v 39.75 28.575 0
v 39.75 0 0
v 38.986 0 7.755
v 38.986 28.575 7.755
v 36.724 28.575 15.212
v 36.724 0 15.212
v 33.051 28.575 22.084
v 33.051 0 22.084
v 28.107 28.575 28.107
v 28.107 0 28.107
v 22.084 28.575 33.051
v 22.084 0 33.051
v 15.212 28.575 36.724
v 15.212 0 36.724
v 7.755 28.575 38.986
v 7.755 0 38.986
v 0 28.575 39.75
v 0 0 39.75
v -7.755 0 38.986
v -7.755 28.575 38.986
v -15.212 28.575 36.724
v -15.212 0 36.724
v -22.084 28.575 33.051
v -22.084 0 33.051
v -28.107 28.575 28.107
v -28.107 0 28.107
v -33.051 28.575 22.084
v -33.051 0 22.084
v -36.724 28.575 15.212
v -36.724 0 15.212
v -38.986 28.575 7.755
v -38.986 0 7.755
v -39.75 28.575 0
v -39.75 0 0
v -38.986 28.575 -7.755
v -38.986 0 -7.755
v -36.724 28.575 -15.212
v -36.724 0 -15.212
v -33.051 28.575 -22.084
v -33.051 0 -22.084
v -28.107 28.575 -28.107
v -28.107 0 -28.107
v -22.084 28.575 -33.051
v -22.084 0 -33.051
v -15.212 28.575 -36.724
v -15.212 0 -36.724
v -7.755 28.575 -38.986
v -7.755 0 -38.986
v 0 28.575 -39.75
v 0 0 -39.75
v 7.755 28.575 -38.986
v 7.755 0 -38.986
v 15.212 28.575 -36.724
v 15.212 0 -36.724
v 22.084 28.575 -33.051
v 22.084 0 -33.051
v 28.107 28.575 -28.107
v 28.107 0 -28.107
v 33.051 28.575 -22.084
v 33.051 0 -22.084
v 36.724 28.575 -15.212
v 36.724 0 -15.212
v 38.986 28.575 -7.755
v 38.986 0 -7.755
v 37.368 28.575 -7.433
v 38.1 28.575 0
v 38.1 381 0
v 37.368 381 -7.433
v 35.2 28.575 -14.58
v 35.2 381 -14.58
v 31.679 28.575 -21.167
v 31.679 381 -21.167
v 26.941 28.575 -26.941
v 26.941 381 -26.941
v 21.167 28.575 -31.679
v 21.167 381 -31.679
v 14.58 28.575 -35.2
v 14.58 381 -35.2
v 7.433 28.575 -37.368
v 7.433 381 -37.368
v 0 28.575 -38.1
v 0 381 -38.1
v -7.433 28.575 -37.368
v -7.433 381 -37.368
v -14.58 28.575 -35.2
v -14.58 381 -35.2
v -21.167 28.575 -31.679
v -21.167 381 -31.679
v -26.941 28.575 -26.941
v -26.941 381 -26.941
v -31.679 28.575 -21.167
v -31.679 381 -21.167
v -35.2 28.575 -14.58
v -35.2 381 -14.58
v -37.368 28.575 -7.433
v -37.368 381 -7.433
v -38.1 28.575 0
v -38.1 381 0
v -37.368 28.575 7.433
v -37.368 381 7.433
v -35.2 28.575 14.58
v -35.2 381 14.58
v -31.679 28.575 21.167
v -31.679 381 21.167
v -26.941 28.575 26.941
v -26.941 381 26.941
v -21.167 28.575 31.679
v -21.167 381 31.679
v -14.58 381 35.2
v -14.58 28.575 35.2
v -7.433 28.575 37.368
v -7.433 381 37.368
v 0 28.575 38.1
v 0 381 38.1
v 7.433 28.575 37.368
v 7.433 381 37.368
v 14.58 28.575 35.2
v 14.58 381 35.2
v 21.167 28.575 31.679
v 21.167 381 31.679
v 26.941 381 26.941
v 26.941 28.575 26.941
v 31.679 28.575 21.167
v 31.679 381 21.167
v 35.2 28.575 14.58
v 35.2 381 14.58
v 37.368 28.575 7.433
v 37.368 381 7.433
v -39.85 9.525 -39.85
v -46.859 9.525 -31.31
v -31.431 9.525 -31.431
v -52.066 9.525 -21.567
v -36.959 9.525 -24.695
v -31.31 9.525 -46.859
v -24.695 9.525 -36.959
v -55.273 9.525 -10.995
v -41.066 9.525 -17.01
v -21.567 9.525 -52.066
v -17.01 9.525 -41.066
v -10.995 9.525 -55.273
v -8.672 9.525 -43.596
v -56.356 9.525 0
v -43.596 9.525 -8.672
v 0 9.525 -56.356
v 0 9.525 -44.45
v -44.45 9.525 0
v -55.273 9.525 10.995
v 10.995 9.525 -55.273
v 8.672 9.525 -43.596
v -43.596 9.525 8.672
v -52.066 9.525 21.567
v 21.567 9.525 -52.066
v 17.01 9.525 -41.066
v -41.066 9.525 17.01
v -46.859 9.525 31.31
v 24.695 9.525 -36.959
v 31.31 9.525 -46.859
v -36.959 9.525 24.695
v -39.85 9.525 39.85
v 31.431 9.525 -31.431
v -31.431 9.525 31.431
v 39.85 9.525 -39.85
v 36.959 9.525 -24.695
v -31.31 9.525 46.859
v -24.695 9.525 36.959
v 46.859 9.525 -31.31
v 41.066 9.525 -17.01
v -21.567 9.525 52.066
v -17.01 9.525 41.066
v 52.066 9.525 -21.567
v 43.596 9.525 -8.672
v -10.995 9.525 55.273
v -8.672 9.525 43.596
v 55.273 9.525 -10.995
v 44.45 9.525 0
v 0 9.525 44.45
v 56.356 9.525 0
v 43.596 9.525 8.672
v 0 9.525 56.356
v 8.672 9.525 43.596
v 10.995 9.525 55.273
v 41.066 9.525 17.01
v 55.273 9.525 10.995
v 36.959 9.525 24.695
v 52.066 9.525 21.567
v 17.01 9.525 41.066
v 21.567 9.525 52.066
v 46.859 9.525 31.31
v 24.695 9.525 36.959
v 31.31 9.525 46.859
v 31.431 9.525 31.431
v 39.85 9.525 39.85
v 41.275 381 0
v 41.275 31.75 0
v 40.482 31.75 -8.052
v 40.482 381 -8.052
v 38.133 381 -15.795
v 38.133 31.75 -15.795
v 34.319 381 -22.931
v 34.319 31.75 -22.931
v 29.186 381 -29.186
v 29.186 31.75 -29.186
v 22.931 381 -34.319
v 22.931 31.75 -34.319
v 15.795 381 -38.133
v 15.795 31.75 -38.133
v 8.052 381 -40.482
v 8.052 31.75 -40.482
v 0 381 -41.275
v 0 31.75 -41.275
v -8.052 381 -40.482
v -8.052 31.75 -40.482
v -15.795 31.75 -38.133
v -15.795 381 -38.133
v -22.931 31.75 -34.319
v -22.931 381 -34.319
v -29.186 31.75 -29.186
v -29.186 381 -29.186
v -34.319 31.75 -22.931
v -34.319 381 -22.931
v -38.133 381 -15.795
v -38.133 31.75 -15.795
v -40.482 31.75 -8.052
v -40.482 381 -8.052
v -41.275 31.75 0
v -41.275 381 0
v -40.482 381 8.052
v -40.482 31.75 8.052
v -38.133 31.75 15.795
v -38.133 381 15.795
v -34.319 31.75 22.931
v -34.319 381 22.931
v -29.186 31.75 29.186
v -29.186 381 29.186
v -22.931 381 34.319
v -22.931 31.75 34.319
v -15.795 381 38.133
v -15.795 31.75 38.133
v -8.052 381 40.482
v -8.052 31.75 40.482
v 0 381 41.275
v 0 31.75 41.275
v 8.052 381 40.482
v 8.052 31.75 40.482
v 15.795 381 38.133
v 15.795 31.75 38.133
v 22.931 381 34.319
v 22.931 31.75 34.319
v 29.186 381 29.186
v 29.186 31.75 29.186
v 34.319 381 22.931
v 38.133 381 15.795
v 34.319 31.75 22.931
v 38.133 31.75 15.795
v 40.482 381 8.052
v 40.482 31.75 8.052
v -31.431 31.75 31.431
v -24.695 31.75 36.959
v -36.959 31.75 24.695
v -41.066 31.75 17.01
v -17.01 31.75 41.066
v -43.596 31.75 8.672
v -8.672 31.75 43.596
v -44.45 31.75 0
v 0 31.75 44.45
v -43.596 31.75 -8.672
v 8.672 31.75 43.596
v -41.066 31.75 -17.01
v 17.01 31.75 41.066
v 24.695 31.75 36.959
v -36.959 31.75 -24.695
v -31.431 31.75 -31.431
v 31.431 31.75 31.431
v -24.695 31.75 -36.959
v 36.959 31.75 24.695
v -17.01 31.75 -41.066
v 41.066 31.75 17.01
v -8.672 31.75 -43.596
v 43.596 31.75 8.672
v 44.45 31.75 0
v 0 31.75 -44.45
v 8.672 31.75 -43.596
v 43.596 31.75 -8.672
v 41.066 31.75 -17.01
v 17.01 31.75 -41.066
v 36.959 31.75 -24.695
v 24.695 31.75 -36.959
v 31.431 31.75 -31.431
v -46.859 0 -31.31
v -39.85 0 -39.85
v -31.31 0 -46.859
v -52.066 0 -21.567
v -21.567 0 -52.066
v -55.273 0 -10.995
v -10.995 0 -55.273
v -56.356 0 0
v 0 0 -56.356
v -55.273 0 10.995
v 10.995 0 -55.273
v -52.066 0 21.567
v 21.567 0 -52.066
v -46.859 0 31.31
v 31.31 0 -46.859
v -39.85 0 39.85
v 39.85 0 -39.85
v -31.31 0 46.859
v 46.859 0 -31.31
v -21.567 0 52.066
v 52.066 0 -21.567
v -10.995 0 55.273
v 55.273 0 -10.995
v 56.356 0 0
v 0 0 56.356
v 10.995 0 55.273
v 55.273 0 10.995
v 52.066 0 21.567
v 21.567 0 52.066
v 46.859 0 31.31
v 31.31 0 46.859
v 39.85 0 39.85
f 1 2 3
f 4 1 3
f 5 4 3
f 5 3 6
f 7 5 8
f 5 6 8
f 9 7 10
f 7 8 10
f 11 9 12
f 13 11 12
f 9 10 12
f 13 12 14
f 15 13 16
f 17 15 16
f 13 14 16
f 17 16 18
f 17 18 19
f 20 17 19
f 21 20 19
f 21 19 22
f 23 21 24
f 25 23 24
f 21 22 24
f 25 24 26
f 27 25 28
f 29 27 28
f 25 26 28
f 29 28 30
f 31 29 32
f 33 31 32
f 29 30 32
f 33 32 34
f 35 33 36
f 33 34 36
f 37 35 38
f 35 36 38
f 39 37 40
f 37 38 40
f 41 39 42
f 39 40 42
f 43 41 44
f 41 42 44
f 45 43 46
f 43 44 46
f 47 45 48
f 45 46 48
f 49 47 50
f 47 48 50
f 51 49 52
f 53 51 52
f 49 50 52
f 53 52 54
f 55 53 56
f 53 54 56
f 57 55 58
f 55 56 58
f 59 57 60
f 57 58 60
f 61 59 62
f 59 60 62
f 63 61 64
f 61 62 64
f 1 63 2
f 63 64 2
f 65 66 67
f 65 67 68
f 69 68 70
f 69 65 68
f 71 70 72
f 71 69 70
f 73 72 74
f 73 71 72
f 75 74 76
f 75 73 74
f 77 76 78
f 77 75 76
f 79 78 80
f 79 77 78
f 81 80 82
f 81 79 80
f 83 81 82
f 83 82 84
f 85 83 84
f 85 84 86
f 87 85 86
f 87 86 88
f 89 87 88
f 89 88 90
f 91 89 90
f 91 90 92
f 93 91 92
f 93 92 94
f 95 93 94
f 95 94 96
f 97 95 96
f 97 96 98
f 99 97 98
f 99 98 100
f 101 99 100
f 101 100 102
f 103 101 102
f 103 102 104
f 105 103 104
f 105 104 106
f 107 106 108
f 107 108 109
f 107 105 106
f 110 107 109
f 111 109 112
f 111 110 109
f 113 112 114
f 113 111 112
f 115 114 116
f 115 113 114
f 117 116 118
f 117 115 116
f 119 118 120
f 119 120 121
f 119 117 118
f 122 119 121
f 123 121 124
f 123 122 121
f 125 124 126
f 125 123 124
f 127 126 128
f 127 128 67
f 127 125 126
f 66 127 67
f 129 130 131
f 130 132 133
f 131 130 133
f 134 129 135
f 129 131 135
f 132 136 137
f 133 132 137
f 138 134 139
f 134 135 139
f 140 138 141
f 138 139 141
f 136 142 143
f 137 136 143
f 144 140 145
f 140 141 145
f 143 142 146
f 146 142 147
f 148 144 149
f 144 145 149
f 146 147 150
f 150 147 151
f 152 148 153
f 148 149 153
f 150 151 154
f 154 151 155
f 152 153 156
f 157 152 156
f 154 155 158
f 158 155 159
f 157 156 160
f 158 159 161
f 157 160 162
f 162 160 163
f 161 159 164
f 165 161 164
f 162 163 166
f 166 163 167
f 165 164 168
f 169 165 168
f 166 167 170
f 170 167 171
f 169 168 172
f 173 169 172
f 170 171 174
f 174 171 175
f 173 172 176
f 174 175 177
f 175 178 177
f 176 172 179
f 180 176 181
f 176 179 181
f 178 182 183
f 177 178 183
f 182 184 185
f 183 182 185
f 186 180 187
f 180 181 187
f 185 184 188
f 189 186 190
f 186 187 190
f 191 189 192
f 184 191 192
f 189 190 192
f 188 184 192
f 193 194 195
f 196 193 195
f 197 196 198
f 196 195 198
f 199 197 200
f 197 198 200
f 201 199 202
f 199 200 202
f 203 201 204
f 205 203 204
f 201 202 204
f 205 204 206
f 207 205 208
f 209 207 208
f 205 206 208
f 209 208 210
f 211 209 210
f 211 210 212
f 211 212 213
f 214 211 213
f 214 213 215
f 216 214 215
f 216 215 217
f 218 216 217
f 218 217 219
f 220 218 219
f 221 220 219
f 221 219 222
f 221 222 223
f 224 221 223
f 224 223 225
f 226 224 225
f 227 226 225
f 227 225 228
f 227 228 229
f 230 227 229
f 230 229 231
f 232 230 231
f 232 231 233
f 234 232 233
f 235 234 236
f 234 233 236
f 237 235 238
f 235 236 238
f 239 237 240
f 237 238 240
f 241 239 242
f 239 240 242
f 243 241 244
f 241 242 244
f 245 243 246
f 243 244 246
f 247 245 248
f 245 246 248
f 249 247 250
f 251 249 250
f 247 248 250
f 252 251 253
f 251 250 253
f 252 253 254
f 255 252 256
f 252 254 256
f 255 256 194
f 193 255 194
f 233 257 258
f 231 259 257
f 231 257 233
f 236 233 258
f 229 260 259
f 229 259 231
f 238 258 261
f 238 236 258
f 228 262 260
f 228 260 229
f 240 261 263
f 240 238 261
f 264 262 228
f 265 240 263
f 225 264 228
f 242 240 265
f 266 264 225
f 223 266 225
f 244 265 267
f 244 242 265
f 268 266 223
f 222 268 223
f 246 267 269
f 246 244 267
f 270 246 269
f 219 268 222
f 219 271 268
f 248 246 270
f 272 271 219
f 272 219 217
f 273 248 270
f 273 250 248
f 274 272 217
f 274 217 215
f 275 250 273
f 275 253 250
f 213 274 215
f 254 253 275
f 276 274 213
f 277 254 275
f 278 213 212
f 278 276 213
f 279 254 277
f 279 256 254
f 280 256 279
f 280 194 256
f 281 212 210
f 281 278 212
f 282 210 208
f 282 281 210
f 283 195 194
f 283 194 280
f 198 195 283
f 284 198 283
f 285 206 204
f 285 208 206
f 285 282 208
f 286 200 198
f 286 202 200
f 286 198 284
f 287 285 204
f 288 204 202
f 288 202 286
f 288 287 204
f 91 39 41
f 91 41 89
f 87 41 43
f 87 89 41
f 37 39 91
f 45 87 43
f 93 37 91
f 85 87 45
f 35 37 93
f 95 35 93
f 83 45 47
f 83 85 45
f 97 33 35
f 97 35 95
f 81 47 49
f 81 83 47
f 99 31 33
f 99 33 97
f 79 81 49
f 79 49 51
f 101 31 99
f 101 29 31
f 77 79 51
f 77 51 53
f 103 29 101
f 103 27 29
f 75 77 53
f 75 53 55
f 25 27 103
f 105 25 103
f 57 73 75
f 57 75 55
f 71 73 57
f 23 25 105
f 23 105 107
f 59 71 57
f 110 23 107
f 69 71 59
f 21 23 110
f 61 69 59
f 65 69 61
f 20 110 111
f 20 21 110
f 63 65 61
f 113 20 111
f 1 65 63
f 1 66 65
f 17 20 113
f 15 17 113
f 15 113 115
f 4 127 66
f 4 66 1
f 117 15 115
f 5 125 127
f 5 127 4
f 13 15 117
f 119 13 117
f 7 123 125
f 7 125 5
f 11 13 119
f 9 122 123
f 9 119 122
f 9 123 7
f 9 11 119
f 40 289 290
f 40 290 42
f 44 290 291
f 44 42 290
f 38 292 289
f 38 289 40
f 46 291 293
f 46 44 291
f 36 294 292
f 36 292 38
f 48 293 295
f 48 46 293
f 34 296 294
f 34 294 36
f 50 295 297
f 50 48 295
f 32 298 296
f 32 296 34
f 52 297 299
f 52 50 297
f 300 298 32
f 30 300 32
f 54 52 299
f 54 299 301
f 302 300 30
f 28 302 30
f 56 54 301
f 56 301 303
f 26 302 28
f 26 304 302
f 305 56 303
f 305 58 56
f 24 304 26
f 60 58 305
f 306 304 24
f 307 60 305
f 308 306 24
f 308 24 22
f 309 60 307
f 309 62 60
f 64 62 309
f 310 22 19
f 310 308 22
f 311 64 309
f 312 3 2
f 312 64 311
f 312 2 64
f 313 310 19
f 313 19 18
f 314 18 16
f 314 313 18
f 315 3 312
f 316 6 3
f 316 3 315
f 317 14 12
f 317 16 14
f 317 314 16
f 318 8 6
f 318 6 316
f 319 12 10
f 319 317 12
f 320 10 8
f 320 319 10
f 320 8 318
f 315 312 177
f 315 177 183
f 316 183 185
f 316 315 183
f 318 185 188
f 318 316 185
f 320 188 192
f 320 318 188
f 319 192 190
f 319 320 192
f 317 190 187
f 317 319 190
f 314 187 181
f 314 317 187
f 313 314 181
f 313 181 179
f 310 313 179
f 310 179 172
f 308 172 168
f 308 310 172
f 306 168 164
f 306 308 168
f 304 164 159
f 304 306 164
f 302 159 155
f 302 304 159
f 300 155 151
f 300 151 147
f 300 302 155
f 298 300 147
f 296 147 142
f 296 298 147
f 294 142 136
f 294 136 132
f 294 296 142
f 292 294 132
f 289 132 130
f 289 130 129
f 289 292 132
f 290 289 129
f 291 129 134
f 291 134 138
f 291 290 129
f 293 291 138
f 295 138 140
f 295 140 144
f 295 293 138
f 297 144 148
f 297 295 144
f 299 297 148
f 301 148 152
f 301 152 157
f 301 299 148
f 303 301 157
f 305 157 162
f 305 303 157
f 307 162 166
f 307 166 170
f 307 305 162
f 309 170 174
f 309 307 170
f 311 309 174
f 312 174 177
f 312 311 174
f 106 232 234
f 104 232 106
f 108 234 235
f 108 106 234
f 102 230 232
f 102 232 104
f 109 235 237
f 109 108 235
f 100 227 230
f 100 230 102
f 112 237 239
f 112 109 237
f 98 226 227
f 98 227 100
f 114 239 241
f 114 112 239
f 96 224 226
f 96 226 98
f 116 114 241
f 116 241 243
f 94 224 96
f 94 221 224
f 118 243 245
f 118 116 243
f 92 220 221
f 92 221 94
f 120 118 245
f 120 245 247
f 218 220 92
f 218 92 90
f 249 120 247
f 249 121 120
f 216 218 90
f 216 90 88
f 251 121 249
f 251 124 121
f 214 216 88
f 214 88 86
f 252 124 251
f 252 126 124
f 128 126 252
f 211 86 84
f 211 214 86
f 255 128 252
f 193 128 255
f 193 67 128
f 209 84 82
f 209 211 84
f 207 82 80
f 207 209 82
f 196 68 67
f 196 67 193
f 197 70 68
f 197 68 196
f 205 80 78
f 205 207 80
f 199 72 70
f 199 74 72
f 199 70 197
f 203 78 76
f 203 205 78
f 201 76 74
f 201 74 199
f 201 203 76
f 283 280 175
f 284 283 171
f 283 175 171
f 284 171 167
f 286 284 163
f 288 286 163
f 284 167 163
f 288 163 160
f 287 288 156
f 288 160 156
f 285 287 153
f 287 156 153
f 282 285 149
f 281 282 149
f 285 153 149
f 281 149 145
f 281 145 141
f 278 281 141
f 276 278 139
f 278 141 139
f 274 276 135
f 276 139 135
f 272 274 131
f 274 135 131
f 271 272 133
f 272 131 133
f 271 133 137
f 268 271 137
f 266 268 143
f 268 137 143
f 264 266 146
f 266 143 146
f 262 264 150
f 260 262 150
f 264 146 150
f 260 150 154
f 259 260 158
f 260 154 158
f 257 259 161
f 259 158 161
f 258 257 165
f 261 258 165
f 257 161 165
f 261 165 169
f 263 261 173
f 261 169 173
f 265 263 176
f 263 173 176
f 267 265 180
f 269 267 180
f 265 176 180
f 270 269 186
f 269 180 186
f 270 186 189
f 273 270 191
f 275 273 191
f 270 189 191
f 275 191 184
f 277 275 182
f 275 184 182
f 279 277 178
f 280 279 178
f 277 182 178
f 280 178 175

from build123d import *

# Parameters (mm, degrees)
SKETCH2_R               = 41.275
SKETCH2_R_2             = 38.1
BASE_CYLINDER_DEPTH     = 381
SKETCH3_R               = 56.35625
SKETCH3_R_2             = 38.1
AFT_FLANGE_DEPTH        = 9.525
SKETCH34_R              = 39.75
TEMPERATUREINSERT_DEPTH = 28.575
SKETCH33_R              = 44.45
SKETCH33_R_2            = 41.275
CRITICALBOSS_DEPTH      = 22.225


with BuildPart() as part:
    # Sketch2 → Base Cylinder (new body)
    with BuildSketch(Plane(origin=(0, 0, 0), x_dir=(1, 0, 0), z_dir=(0, 1, 0))):
        Circle(SKETCH2_R)
        Circle(SKETCH2_R_2, mode=Mode.SUBTRACT)
    extrude(amount=BASE_CYLINDER_DEPTH)

    # Sketch3 → Aft Flange (add)
    with BuildSketch(Plane.XZ):
        Circle(SKETCH3_R)
        Circle(SKETCH3_R_2, mode=Mode.SUBTRACT)
    extrude(amount=-AFT_FLANGE_DEPTH)

    # Sketch34 → TemperatureInsert (cut)
    with BuildSketch(Plane.XZ):
        Circle(SKETCH34_R)
    extrude(amount=-TEMPERATUREINSERT_DEPTH, mode=Mode.SUBTRACT)

    # Sketch33 → CriticalBoss (add)
    with BuildSketch(Plane(origin=(0, 9.525, 0), x_dir=(1, 0, 0), z_dir=(0, 1, 0))):
        Circle(SKETCH33_R)
        Circle(SKETCH33_R_2, mode=Mode.SUBTRACT)
    extrude(amount=CRITICALBOSS_DEPTH)


solid = part.part
